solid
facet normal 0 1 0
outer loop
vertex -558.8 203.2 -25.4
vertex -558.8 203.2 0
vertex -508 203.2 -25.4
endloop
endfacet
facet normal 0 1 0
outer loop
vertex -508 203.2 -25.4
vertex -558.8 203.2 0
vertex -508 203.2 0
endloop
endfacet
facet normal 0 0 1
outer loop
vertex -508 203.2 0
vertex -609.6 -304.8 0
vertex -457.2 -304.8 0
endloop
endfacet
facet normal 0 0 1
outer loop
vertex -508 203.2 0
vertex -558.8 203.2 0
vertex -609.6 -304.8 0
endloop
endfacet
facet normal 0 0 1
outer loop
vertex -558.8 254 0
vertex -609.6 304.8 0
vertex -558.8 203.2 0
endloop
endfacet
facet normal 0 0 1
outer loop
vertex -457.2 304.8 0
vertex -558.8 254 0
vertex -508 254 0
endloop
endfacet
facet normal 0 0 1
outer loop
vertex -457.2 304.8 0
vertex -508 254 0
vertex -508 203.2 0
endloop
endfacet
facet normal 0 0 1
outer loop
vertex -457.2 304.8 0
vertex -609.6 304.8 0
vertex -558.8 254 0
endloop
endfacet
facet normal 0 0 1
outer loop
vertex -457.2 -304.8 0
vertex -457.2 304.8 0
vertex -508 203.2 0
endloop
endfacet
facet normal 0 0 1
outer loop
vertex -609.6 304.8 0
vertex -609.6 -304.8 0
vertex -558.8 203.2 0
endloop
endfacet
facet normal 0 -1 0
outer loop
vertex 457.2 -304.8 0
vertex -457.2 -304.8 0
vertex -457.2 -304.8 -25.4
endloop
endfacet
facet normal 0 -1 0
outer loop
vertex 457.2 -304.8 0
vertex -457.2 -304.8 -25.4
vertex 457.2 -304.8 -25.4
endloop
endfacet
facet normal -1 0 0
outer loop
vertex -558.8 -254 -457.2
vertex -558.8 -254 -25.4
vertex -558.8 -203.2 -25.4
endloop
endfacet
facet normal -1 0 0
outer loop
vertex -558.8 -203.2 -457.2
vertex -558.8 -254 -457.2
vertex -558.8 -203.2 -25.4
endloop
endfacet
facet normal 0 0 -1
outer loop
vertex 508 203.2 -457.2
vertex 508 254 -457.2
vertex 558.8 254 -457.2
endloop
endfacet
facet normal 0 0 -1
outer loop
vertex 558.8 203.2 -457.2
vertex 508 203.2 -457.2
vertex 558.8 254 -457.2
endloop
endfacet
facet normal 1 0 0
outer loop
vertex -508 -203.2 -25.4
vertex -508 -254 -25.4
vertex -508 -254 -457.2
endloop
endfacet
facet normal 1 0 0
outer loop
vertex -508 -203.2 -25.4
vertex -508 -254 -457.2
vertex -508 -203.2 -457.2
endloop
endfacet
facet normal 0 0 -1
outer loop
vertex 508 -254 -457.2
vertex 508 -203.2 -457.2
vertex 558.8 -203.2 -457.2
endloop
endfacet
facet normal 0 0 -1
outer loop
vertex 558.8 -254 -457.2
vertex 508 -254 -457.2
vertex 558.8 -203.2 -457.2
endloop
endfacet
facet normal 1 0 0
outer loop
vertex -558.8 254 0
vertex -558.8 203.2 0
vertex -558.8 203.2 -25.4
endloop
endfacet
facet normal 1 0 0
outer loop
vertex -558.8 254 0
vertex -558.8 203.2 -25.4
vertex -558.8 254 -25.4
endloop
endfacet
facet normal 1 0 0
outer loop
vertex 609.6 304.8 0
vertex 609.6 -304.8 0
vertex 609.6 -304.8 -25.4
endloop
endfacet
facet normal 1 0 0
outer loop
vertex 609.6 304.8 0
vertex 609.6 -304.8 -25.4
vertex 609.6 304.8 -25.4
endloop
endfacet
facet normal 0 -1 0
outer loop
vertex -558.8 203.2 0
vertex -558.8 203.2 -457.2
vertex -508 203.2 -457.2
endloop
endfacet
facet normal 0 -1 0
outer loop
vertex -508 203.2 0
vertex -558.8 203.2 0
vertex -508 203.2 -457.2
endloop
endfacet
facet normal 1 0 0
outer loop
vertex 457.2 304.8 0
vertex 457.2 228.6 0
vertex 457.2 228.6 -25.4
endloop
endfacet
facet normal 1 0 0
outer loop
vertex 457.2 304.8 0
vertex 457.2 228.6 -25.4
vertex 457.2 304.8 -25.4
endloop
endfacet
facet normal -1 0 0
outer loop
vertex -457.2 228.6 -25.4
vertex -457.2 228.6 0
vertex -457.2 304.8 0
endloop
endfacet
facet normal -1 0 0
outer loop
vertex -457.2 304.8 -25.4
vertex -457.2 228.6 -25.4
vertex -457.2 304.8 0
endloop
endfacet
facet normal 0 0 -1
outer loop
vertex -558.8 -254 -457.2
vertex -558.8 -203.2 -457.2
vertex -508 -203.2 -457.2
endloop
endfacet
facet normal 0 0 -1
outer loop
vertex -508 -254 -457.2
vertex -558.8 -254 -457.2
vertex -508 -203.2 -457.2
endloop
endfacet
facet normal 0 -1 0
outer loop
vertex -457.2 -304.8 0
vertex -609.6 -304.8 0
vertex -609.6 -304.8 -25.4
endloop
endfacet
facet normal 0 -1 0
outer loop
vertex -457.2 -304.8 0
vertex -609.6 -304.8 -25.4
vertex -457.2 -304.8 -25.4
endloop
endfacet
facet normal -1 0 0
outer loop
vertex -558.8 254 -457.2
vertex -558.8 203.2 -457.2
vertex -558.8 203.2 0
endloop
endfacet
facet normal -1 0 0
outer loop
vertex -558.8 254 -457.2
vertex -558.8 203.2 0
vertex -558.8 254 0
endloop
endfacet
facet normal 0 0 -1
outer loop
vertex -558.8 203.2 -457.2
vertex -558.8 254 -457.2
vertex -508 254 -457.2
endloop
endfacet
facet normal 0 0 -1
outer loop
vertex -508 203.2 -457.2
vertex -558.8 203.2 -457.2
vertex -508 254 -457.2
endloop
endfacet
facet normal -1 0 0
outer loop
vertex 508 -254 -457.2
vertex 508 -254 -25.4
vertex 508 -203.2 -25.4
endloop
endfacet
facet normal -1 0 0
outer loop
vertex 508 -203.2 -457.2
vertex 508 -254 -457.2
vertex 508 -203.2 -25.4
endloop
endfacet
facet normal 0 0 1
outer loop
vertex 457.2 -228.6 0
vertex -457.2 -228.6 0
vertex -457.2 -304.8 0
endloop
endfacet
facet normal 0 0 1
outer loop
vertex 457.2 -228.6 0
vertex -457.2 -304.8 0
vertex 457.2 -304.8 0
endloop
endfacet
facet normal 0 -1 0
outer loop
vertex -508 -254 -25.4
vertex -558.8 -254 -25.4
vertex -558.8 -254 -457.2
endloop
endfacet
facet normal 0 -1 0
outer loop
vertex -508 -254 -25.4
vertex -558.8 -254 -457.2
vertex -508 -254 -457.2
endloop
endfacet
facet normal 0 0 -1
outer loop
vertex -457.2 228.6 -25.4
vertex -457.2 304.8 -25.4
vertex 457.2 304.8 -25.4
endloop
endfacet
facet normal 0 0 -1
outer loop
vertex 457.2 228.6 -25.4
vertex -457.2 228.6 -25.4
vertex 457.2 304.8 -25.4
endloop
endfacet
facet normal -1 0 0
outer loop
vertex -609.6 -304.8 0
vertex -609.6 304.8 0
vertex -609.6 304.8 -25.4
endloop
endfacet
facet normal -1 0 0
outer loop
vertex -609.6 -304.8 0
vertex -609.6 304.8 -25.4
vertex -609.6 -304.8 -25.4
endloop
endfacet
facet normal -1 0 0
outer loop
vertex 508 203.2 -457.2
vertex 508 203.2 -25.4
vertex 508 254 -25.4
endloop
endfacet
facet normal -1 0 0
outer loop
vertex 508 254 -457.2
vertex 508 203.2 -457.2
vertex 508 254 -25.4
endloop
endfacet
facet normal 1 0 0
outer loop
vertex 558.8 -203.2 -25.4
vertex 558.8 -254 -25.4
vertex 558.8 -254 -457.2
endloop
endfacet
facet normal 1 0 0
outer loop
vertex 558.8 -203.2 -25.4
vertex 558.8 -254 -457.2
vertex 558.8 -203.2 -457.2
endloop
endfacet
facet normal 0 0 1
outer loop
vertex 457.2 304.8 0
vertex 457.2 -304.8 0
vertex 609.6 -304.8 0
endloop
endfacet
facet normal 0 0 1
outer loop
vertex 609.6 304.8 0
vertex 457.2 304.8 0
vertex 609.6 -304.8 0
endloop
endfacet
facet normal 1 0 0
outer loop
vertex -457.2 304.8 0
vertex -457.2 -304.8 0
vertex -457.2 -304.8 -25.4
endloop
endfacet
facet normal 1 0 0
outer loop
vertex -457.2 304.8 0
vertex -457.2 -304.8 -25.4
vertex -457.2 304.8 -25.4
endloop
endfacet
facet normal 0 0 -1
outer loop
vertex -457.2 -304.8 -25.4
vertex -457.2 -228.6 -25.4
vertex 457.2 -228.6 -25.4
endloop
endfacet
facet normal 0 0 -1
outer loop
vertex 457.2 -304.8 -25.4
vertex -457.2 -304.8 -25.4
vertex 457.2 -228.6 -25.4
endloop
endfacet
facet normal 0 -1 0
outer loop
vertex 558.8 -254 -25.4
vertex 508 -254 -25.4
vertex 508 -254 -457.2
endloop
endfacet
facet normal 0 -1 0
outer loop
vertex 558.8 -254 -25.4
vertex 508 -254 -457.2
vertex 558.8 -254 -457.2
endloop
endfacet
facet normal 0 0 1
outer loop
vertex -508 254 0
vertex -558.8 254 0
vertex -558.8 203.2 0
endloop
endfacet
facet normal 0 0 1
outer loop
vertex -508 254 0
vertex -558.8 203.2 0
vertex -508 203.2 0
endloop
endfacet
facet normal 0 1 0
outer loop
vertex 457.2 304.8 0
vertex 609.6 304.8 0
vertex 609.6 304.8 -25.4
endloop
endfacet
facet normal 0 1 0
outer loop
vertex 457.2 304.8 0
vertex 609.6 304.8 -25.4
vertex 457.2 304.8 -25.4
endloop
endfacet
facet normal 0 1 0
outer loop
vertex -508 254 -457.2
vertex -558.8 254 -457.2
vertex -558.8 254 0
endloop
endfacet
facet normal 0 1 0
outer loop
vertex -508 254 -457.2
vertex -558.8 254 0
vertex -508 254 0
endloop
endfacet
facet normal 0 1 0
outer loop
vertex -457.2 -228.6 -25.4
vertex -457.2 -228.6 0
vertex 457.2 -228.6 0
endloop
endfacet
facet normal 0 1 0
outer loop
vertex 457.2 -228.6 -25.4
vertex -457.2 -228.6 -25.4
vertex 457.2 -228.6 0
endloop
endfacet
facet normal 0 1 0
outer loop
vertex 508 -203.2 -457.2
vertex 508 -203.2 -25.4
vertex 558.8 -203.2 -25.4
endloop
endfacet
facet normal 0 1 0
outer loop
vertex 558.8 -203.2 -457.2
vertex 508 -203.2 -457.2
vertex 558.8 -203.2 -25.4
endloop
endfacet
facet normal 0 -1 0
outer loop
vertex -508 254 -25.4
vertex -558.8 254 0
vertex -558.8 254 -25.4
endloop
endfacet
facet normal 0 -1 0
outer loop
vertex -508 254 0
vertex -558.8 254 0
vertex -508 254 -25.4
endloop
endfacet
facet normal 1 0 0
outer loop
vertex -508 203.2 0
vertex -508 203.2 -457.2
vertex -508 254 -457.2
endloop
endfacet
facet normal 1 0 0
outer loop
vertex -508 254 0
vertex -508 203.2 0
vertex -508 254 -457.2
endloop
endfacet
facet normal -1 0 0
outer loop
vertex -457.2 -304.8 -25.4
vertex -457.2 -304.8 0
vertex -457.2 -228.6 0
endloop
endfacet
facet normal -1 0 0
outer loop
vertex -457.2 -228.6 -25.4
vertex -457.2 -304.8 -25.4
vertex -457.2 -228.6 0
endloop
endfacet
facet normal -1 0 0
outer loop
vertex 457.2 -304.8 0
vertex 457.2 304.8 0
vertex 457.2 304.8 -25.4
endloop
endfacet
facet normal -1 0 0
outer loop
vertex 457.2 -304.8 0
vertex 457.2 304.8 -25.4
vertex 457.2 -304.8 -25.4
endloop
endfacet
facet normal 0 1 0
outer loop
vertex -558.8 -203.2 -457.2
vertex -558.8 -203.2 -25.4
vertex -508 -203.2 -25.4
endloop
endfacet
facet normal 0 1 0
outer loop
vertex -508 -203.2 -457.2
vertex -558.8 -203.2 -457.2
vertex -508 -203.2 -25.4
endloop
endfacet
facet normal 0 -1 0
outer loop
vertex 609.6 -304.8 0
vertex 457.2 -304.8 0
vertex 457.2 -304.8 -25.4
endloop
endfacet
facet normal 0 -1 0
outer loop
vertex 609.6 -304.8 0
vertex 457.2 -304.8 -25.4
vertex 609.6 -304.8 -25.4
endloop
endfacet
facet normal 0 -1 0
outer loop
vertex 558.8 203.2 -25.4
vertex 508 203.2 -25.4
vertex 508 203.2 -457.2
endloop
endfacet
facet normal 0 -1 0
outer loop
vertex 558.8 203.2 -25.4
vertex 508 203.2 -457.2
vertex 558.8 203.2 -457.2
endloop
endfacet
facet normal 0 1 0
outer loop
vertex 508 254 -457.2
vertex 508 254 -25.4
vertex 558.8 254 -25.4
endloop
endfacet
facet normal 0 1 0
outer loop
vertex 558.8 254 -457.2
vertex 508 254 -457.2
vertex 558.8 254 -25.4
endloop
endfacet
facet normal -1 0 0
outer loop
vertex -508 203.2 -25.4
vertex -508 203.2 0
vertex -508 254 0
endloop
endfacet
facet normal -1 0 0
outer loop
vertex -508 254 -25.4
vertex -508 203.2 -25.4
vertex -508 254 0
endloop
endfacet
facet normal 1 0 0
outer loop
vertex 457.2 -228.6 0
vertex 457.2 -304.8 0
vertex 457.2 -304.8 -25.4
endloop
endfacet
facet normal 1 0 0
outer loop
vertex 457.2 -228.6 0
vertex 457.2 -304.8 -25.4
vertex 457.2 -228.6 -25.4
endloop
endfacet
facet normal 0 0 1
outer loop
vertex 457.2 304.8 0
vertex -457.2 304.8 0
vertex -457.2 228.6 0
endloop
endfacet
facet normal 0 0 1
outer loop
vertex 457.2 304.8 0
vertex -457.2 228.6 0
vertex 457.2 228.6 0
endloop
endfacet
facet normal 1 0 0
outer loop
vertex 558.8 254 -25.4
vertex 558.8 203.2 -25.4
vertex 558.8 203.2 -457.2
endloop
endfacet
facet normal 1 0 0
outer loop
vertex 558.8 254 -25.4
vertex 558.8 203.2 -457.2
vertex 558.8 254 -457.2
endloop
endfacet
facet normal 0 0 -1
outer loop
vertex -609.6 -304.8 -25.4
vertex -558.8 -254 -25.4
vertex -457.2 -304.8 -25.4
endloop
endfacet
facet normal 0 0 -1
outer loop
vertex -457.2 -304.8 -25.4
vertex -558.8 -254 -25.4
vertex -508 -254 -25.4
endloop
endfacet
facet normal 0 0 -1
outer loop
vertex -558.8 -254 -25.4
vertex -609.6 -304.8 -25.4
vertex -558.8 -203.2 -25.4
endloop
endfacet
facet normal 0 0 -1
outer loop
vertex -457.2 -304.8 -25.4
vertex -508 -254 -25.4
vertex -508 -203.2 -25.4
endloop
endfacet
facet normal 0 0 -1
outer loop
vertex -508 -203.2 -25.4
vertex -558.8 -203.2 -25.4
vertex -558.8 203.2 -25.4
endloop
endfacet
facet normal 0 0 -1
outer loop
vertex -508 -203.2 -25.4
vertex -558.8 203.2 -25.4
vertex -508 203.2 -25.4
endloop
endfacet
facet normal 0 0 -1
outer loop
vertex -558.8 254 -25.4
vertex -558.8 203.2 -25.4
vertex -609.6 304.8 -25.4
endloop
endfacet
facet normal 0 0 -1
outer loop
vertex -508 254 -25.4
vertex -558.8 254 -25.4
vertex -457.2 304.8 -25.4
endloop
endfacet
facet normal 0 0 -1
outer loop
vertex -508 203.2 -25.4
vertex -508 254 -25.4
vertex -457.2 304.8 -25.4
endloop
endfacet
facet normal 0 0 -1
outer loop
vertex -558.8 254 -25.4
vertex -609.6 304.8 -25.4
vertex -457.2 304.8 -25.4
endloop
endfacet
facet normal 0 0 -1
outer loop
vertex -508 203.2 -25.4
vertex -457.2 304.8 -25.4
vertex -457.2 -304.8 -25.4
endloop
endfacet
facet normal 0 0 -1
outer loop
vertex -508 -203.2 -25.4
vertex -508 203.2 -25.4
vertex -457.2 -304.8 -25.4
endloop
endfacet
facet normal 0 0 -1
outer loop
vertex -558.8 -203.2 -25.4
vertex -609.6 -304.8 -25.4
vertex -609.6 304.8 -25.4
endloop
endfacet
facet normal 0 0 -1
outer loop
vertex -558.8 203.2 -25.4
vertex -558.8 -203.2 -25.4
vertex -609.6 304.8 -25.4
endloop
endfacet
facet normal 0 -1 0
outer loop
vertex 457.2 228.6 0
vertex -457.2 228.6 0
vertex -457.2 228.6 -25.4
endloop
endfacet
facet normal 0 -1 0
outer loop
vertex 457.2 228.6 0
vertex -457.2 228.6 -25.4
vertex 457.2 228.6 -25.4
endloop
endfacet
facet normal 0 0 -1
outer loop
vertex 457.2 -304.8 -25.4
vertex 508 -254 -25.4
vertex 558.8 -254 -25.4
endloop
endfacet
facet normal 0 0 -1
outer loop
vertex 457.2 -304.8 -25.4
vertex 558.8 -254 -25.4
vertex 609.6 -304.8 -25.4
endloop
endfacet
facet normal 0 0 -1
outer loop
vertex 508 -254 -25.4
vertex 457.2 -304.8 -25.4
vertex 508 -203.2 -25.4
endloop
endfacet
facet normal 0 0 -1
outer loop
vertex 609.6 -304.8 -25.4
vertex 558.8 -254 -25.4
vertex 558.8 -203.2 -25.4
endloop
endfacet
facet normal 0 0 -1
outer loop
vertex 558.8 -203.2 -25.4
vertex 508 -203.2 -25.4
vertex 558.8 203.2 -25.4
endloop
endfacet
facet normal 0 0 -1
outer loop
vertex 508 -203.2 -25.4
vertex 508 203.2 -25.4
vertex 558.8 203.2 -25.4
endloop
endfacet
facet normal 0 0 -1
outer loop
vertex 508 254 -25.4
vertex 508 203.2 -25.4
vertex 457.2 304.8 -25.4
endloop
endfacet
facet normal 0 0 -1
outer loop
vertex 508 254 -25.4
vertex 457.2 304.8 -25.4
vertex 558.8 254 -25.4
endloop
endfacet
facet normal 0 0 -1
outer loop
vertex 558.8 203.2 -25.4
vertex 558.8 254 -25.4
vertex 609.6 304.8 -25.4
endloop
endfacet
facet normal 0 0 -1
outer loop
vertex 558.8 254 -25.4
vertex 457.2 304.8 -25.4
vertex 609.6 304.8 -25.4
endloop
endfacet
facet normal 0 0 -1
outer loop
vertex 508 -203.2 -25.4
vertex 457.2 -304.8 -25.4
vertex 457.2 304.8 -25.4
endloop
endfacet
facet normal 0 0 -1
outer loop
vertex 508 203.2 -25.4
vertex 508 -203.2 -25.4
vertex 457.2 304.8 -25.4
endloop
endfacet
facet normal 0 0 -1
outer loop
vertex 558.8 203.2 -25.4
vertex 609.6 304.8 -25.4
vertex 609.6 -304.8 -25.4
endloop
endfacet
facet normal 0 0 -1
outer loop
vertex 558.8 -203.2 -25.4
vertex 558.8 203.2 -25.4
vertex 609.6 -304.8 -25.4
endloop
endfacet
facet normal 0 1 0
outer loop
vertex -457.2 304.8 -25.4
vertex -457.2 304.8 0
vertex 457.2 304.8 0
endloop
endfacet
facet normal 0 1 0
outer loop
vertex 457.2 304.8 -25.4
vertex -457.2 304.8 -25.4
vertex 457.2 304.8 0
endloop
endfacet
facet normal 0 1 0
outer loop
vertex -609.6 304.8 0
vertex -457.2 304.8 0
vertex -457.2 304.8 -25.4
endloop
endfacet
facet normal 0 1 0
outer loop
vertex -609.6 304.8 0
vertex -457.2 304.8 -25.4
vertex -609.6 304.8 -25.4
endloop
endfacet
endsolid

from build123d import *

# Parameters (mm, degrees)
F1_W     = 50.8
F1_H     = 50.8
F2_DEPTH = 25.4
F0_W     = 50.8
F0_H     = 50.8
F3_DEPTH = 25.4
F0_W_2   = 914.4
F0_H_2   = 76.2
F4_DEPTH = 25.4
F5_DEPTH = 25.4
F6_DEPTH = 457.2
F7_DEPTH = 457.2
F8_DEPTH = 457.2
F9_DEPTH = 457.2


with BuildPart() as f2:
    # F1 (on face) → F2 (new body)
    with BuildSketch(Plane.XY):
        Polygon((-457.2, -304.8), (-457.2, -228.6), (-457.2, 228.6), (-457.2, 304.8), (-609.6, 304.8), (-609.6, -304.8), align=None)
        with Locations((-533.4, -228.6)):
            Rectangle(F1_W, F1_H, mode=Mode.SUBTRACT)
        with Locations((-533.4, 228.6)):
            Rectangle(F1_W, F1_H, mode=Mode.SUBTRACT)
    extrude(amount=-F2_DEPTH)

    # F0 (on Top) → F7 (join)
    with BuildSketch(Plane.XY):
        with Locations((-533.4, -228.6)):
            Rectangle(F0_W, F0_H)
    extrude(amount=-F7_DEPTH)


with BuildPart() as f3:
    # F0 (on Top) → F3 (new body)
    with BuildSketch(Plane.XY):
        Polygon((457.2, 304.8), (457.2, 228.6), (457.2, -228.6), (457.2, -304.8), (609.6, -304.8), (609.6, 304.8), align=None)
        with Locations((533.4, -228.6)):
            Rectangle(F0_W, F0_H, mode=Mode.SUBTRACT)
        with Locations((533.4, 228.6)):
            Rectangle(F0_W, F0_H, mode=Mode.SUBTRACT)
    extrude(amount=-F3_DEPTH)

    # F0 (on Top) → F8 (join)
    with BuildSketch(Plane.XY):
        with Locations((533.4, -228.6)):
            Rectangle(F0_W, F0_H)
    extrude(amount=-F8_DEPTH)

    # F0 (on Top) → F9 (join)
    with BuildSketch(Plane.XY):
        with Locations((533.4, 228.6)):
            Rectangle(F0_W, F0_H)
    extrude(amount=-F9_DEPTH)


with BuildPart() as f4:
    # F0 (on Top) → F4 (new body)
    with BuildSketch(Plane.XY):
        with Locations((0, 266.7)):
            Rectangle(F0_W_2, F0_H_2)
    extrude(amount=-F4_DEPTH)


with BuildPart() as f5:
    # F0 (on Top) → F5 (new body)
    with BuildSketch(Plane.XY):
        with Locations((0, -266.7)):
            Rectangle(F0_W_2, F0_H_2)
    extrude(amount=-F5_DEPTH)


with BuildPart() as f6:
    # F0 (on Top) → F6 (new body)
    with BuildSketch(Plane.XY):
        with Locations((-533.4, 228.6)):
            Rectangle(F0_W, F0_H)
    extrude(amount=-F6_DEPTH)


solid = Compound([f2.part, f3.part, f4.part, f5.part, f6.part])
